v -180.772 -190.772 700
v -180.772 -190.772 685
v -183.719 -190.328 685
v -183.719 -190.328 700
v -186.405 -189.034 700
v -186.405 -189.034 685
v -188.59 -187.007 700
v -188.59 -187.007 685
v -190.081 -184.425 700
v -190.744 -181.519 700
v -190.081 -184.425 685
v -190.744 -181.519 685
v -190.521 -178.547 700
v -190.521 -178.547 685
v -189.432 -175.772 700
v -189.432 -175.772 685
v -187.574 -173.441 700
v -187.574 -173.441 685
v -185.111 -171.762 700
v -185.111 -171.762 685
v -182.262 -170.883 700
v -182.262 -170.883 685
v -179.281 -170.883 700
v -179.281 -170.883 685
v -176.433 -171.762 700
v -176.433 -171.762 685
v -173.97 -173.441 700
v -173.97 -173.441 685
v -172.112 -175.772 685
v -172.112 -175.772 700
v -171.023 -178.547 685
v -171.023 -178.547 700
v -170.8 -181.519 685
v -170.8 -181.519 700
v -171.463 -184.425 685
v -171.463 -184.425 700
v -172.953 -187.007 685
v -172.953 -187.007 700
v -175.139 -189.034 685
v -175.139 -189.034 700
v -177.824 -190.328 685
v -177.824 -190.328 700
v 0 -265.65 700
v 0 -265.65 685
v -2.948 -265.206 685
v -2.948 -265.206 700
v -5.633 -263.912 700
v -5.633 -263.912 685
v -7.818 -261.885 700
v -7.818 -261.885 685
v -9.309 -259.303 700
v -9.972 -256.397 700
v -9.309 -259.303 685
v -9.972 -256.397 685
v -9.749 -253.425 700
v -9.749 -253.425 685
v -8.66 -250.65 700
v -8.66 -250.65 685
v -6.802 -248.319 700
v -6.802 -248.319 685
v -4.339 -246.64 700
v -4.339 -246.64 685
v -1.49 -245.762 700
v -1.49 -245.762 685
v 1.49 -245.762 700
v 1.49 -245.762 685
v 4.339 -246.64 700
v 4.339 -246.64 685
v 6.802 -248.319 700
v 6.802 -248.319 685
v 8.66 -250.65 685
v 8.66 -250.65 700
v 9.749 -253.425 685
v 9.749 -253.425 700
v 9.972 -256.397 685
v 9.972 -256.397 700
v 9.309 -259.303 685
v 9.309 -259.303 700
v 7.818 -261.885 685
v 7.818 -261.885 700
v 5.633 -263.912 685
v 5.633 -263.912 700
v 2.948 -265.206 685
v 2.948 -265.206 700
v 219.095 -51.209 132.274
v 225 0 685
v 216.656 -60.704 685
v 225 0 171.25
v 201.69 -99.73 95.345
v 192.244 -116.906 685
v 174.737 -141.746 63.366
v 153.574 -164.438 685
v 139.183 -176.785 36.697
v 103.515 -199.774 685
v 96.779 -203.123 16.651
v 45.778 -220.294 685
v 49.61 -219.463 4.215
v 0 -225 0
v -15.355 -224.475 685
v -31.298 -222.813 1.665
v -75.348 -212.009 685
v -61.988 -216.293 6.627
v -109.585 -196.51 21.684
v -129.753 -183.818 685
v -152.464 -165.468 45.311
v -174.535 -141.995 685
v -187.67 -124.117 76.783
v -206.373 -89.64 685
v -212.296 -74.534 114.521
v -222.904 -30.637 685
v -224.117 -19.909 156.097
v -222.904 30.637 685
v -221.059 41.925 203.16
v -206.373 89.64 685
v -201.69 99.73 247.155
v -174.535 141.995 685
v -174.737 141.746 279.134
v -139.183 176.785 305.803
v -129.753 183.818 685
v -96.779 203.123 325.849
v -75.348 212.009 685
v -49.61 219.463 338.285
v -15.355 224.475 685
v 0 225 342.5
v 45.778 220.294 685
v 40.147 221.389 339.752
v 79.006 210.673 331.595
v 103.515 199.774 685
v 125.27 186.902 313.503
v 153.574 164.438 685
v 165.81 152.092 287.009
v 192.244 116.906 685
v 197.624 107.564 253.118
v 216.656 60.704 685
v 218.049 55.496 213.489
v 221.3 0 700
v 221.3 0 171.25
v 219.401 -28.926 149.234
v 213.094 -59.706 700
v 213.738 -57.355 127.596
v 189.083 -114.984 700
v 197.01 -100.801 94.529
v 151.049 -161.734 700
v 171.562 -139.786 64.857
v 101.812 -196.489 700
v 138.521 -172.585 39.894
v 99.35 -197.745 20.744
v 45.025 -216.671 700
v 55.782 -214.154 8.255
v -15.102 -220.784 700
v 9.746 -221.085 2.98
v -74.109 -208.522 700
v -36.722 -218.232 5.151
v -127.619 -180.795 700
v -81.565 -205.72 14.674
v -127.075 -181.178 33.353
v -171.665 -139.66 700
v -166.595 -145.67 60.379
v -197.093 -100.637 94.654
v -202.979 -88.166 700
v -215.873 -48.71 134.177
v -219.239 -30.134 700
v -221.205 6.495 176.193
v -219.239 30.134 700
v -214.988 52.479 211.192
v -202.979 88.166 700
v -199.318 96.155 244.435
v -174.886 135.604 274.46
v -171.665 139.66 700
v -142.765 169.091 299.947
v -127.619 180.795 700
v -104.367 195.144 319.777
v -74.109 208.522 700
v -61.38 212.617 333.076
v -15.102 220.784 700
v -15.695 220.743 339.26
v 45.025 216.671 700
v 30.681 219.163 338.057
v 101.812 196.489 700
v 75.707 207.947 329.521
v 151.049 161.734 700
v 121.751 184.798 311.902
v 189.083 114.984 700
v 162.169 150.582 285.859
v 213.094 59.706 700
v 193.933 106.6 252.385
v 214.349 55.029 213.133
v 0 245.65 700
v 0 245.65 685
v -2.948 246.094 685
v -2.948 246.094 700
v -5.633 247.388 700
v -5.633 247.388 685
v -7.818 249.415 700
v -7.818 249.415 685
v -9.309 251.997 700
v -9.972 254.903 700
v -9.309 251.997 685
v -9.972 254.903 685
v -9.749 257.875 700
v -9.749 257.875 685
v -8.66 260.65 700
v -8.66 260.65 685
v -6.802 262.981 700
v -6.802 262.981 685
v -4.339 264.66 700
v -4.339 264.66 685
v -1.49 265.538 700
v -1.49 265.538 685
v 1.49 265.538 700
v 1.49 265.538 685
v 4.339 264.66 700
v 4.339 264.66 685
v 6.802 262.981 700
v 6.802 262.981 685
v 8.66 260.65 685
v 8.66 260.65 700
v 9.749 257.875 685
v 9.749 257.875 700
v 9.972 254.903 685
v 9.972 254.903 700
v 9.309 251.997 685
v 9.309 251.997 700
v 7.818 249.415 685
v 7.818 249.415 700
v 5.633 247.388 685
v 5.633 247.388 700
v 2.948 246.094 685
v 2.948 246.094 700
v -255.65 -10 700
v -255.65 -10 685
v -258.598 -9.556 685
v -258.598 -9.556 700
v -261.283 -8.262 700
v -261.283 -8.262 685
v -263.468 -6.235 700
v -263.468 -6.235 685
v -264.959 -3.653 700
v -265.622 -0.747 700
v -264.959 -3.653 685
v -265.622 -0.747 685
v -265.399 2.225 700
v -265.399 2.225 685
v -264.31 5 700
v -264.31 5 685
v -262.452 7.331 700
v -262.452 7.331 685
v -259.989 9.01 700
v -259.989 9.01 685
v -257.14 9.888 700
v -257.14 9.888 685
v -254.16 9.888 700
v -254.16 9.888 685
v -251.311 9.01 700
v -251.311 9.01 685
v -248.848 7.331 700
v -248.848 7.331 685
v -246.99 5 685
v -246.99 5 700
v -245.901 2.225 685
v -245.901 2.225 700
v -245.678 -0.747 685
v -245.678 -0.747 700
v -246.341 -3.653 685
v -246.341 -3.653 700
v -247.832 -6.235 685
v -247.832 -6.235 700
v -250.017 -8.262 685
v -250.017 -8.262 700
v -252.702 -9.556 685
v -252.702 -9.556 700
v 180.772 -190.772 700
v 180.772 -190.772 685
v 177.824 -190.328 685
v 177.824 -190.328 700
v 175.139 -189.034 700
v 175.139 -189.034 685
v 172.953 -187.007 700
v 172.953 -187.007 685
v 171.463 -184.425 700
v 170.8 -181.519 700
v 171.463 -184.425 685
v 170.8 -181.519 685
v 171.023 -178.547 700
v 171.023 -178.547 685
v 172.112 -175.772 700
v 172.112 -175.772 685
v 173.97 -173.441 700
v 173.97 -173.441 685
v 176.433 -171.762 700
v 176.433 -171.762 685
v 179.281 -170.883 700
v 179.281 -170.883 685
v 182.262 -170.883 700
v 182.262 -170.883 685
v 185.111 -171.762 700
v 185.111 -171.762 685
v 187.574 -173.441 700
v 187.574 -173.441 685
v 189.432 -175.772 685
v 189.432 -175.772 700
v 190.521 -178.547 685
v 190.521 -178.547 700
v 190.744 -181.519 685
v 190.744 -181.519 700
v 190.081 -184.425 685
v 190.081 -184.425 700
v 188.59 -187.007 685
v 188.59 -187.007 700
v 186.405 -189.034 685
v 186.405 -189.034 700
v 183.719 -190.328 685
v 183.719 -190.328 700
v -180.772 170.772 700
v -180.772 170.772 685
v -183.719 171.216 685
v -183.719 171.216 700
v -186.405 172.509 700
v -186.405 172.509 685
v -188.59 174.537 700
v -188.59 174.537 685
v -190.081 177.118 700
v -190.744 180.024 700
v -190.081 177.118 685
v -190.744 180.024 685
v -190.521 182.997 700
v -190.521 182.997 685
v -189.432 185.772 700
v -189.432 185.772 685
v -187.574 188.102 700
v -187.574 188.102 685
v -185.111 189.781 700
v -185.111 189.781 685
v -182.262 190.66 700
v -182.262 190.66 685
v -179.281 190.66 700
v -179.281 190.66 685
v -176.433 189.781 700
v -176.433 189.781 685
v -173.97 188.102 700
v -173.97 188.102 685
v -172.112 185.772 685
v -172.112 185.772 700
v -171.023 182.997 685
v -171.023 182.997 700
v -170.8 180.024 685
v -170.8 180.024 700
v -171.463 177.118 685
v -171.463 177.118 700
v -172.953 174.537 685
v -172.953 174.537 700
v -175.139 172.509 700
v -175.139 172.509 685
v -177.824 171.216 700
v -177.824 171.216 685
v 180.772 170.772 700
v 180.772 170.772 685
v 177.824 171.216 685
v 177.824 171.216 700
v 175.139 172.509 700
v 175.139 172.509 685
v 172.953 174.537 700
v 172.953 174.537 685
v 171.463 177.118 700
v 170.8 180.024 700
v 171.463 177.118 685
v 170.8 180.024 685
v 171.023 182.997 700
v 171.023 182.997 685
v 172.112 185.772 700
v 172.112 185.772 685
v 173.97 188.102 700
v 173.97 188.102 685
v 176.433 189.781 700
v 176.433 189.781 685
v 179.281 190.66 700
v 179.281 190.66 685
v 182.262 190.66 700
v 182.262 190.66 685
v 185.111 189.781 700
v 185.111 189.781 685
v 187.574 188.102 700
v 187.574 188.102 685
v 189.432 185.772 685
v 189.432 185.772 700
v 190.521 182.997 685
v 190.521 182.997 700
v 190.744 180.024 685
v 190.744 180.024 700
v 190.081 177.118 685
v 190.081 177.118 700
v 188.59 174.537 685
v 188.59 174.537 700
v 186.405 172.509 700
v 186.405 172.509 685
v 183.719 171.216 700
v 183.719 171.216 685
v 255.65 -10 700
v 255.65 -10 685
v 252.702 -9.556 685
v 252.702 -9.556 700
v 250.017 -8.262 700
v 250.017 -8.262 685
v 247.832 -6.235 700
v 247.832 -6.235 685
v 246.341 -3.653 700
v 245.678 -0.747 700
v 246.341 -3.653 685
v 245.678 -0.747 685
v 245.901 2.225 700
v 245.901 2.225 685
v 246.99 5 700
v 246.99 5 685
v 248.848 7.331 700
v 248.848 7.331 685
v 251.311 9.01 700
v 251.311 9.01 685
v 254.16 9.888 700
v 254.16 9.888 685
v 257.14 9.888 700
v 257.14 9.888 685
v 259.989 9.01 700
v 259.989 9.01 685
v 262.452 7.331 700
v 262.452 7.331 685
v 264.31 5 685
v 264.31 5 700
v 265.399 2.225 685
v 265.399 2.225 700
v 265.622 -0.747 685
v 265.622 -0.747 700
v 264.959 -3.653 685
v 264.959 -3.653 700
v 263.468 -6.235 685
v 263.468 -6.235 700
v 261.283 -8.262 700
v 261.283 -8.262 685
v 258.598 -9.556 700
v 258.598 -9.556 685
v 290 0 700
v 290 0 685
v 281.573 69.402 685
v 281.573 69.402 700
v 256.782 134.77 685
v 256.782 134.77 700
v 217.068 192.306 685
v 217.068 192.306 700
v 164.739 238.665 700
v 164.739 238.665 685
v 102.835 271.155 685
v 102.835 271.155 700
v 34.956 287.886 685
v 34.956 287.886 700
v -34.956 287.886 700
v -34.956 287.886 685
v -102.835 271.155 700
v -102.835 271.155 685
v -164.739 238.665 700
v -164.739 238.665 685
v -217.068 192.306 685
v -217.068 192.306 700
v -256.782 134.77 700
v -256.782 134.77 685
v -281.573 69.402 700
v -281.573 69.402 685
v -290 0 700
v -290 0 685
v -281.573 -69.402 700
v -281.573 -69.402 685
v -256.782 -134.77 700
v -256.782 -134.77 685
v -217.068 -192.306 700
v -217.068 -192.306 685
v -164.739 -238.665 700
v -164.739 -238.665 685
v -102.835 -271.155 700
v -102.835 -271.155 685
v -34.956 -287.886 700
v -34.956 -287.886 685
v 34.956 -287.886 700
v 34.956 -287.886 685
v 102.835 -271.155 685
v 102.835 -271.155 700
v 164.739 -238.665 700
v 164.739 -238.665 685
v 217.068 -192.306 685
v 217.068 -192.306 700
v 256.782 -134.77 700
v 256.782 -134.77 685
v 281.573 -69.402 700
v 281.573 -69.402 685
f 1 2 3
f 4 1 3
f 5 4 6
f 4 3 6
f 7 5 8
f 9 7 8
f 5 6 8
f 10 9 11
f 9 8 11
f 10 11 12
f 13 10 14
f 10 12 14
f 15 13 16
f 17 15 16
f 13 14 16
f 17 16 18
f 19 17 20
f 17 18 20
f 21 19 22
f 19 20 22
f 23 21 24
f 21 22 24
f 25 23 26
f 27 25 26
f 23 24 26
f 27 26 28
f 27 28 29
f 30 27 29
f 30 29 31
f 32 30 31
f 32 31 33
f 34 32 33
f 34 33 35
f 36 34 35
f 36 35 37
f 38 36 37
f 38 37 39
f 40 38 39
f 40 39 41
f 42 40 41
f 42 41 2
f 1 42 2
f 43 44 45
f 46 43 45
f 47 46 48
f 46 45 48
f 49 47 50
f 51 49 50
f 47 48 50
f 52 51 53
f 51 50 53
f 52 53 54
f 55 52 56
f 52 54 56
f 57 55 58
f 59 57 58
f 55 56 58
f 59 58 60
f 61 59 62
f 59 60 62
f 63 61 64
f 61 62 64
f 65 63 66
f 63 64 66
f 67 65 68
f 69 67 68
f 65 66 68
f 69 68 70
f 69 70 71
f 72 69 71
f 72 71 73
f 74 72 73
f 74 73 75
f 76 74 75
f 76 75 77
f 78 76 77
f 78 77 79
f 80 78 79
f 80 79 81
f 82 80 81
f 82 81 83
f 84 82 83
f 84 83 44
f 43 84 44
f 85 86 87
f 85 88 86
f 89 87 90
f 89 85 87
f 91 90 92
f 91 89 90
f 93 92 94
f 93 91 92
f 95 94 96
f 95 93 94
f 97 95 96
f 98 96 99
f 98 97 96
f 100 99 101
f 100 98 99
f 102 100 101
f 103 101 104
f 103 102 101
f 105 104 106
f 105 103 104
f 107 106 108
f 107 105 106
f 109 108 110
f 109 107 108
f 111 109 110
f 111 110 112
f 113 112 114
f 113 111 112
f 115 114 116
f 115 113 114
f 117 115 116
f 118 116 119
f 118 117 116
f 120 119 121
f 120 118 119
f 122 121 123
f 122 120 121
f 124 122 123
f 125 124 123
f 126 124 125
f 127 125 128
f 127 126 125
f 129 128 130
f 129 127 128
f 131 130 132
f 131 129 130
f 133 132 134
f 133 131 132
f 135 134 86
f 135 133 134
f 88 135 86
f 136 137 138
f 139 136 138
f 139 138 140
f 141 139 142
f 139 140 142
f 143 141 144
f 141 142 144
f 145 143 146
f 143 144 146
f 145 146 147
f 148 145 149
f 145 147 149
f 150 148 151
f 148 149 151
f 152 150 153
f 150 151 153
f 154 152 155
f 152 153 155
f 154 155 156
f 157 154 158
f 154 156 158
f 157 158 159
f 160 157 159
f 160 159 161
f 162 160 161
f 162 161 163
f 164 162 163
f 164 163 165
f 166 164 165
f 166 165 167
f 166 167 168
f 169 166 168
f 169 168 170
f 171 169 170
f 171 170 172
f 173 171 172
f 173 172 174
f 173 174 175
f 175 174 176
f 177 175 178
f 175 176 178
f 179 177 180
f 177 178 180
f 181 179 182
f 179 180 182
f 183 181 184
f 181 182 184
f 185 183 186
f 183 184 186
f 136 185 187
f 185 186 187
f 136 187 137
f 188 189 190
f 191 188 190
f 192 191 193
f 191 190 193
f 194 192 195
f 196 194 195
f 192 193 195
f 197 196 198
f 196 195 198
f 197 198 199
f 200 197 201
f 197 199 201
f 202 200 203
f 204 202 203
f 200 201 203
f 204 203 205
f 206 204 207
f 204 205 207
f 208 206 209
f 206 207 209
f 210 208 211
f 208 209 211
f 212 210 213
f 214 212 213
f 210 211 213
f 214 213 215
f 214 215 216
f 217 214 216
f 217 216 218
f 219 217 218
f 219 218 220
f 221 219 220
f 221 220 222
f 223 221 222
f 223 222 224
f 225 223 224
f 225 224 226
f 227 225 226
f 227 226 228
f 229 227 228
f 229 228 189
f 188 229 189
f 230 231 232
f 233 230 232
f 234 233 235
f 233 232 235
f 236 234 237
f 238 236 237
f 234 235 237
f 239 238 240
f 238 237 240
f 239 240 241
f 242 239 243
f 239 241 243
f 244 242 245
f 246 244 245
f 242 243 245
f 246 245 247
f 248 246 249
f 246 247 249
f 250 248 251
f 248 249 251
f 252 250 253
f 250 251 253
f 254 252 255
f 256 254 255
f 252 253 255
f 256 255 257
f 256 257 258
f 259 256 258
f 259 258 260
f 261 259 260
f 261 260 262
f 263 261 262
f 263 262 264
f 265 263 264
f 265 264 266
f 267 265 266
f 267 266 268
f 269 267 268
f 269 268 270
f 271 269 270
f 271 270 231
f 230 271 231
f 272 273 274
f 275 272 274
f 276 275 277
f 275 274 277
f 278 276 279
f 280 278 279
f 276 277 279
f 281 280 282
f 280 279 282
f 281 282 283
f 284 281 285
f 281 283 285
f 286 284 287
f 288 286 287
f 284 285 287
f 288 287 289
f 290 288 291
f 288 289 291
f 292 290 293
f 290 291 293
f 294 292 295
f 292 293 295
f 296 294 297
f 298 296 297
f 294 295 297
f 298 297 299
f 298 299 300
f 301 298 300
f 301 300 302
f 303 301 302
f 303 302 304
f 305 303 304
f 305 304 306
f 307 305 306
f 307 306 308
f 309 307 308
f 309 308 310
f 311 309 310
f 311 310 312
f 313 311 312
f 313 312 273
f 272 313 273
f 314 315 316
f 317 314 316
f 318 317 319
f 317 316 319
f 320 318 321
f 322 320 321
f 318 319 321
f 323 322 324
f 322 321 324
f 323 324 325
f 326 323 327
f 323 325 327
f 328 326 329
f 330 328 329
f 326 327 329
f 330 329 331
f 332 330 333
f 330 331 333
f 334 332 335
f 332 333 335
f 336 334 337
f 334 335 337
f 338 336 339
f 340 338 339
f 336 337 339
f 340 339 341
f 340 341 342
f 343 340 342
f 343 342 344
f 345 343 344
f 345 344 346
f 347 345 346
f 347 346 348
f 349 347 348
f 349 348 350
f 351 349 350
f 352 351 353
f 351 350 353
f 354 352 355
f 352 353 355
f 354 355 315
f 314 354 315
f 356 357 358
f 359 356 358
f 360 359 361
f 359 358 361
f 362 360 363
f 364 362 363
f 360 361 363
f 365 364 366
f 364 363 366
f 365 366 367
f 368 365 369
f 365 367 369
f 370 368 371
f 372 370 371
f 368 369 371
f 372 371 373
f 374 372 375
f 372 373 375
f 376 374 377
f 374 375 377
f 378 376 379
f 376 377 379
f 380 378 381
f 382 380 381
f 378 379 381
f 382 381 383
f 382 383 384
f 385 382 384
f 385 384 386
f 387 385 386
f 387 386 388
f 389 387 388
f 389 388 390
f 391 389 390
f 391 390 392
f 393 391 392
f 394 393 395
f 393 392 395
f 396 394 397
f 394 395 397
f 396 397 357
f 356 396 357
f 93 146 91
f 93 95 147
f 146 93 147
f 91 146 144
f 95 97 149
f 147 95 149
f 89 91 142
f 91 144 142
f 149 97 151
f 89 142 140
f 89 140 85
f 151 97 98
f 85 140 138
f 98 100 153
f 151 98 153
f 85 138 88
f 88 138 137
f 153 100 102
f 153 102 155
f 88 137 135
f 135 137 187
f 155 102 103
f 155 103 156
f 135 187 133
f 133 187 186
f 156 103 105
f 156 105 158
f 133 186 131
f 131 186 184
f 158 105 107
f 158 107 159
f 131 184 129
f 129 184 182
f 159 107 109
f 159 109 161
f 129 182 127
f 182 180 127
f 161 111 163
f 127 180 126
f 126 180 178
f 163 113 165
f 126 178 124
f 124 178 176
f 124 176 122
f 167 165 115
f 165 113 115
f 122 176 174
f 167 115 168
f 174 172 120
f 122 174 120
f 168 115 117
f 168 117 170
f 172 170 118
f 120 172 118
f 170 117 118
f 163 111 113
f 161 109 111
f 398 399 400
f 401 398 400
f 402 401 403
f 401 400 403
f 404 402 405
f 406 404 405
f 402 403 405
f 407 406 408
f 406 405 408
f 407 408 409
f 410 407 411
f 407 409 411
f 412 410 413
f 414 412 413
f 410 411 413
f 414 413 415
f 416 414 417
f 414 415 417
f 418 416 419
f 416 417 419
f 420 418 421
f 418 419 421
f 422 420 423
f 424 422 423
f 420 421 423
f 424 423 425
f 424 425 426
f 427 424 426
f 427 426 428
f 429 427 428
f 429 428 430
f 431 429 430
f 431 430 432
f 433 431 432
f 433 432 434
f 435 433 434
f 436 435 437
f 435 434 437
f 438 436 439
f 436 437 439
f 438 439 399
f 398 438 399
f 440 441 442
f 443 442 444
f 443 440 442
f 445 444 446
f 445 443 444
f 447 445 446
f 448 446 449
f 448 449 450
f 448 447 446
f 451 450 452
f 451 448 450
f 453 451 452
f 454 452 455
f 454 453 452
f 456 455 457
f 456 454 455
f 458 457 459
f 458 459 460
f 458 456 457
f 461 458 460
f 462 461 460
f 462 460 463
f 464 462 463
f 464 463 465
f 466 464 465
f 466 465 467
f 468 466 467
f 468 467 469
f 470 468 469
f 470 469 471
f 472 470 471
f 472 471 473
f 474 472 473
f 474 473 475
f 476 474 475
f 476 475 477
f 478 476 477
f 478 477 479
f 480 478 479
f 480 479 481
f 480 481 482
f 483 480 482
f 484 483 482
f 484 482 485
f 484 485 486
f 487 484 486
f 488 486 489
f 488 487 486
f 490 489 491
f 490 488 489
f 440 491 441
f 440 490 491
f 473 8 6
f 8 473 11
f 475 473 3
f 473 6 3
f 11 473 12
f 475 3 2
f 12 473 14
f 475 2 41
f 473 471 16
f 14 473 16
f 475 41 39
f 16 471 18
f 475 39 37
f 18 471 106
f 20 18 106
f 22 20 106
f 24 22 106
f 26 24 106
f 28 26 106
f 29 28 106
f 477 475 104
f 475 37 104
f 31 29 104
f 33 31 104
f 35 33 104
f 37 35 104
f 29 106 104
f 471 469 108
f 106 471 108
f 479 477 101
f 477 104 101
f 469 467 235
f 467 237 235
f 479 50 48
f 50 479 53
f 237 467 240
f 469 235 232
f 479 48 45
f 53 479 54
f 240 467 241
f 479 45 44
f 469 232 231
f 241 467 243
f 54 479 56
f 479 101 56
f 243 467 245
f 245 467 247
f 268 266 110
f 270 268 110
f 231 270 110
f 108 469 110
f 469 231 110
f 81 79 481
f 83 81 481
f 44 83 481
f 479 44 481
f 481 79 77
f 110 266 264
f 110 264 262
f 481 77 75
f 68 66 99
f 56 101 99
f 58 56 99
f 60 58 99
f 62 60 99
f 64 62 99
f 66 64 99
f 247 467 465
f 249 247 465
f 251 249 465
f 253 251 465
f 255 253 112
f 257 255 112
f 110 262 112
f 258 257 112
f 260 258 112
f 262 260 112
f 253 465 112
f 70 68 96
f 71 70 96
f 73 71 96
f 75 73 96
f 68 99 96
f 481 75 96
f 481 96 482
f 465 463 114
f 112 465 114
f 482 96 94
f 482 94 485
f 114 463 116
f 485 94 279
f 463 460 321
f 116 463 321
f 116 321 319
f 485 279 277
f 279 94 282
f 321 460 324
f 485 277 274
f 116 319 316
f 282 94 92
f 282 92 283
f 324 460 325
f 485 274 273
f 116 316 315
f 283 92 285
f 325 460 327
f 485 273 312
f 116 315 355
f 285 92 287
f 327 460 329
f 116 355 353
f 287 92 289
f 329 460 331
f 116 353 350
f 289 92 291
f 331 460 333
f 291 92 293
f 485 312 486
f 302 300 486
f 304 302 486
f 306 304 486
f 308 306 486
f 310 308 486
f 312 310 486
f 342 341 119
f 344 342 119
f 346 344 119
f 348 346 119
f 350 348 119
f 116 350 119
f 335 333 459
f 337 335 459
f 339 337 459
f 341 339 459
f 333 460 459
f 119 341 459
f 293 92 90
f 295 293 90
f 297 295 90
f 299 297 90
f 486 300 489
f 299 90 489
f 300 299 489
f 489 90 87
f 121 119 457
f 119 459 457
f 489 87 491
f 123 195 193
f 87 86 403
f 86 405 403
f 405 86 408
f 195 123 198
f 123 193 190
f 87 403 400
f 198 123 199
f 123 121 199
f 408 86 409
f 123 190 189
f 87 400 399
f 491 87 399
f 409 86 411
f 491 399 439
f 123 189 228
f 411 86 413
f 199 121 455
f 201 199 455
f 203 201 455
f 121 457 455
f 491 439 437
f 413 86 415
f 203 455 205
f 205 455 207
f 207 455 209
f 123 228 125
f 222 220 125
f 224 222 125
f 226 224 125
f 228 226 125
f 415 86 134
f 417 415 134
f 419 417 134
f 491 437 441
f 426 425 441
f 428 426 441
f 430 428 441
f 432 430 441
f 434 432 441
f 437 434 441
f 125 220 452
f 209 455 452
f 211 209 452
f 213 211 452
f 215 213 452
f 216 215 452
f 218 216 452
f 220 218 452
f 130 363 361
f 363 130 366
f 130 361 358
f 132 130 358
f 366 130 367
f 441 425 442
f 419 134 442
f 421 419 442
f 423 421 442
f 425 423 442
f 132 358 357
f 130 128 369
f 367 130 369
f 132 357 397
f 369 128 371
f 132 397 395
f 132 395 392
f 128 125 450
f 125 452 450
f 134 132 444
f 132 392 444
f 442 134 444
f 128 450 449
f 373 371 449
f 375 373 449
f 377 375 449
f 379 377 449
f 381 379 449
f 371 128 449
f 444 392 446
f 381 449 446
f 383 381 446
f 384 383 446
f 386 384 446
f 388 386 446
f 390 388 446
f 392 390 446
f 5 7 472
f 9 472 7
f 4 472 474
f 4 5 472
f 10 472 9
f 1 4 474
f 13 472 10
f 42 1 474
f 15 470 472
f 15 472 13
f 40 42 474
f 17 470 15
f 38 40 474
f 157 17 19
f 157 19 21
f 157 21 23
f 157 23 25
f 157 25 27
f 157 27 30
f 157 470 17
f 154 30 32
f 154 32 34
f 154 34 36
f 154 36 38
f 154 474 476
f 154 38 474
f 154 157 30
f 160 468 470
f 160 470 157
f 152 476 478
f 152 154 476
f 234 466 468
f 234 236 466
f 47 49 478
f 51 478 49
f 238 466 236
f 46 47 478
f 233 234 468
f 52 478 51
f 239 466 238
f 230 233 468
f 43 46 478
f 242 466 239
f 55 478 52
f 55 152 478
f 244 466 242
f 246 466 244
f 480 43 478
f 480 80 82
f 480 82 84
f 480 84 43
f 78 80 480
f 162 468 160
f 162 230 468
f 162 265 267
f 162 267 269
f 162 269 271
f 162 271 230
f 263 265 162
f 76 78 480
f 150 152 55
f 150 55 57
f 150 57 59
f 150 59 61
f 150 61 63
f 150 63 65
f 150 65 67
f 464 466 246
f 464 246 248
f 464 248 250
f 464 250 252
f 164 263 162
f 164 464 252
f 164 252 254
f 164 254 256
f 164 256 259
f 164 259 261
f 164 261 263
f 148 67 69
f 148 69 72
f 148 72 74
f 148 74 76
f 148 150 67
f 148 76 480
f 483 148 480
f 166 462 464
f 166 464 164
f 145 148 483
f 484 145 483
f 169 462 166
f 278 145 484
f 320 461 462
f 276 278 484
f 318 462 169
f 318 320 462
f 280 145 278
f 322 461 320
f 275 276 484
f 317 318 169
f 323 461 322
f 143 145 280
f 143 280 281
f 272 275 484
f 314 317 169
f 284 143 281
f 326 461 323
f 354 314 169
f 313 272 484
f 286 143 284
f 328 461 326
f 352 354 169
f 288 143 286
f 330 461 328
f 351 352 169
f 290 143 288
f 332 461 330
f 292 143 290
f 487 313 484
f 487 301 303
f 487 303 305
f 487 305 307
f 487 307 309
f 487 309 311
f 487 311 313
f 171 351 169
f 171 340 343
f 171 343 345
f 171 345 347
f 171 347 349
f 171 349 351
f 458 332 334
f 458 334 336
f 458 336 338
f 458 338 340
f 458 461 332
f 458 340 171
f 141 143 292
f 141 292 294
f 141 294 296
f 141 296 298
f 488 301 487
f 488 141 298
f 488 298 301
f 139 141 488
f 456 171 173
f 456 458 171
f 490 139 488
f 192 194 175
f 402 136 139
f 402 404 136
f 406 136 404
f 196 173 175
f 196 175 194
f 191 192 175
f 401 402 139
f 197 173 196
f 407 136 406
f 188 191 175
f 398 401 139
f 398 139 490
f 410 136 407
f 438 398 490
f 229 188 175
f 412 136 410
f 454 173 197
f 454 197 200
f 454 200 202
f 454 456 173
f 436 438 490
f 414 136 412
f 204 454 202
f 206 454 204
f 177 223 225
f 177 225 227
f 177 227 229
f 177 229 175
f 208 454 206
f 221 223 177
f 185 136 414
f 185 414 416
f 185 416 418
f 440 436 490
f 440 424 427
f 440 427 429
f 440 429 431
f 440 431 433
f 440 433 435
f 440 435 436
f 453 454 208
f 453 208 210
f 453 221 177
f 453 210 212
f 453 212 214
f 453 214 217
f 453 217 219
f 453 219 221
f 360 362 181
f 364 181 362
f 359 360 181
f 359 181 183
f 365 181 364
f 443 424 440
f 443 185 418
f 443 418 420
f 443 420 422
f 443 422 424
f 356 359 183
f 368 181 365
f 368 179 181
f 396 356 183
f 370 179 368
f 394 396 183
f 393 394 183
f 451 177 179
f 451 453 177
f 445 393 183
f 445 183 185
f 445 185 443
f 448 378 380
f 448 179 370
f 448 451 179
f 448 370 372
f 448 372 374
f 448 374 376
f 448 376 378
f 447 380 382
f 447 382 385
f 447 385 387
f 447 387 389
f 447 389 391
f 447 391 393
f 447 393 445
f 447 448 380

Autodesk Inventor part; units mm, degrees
ref_plane "YZ Plane" through (0, 0, 0) normal (1, 0, 0) x (0, 1, 0)
ref_plane "XZ Plane" through (0, 0, 0) normal (0, 1, 0) x (-1, 0, 0)
ref_plane "XY Plane" through (0, 0, 0) normal (0, 0, 1) x (1, 0, 0)
sketch "草图1" plane through (0, 0, 0) normal (0, 0, 1) x (1, 0, 0)
  circle A0 centre (0, 0) radius 225
  dimension "d0" = 450
surface extrude "拉伸曲面1" sketch "草图1" along normal blind 700 shown no curves A0
thicken "加厚1" operation new thickness 3.7 both sides no extend neighbours no toward (-0.9057566, 0.4237984, 0) faces at (203.7952, -95.3546, 466.6667)
sketch "草图2" plane through (0, 0, 700) normal (0, 0, 1) x (1, 0, 0)
  circle A0 centre (0, 0) radius 225 projected
  circle A1 centre (0, 0) radius 221.3 projected
  circle A2 centre (0, 0) radius 290
  dimension "d18" = 580
  dimension "d19" = 442.6
  dimension "d20" = 450
extrude "拉伸1" add sketch "草图2" against normal blind 15 contours A2
sketch "草图3" plane through (0, 0, 700) normal (0, 0, 1) x (1, 0, 0)
  circle A0 centre (0, 0) radius 290 projected
  circle A1 centre (0, 0) radius 221.3 projected
  line L0 (0, -221.3) -> (0, -290)
  point P0 (0, -255.65)
  point P1 (180.7718, -180.7718)
  point P2 (255.65, 0)
  point P3 (180.7718, 180.7718)
  point P4 (0, 255.65)
  point P5 (-180.7718, 180.7718)
  point P6 (-255.65, 0)
  point P7 (-180.7718, -180.7718)
  dimension "d9" = 360
  dimension "d21" = 255.65
hole "孔1" at (0, -255.65, 700) at (180.7718, -180.7718, 700) at (255.65, 0, 700) at (180.7718, 180.7718, 700) at (0, 255.65, 700) at (-180.7718, 180.7718, 700) at (-255.65, 0, 700) at (-180.7718, -180.7718, 700) direction (0, 0, -1) diameter 20 end through all
sketch "草图4" plane through (0, 0, 0) normal (1, 0, 0) x (0, 1, 0)
  line L0 (-225, 685) -> (225, 685) projected
  line L1 (225, 0) -> (-225, 0) projected
  line L2 (225, 0) -> (-225, 0) projected
  line L3 (-225, 0) -> (225, 342.5)
  line L4 (225, 0) -> (225, 685) projected
  point P0 (0, 0)
extrude "拉伸2" cut sketch "草图4" along normal mid plane 1000
properties part number "进气孔"
